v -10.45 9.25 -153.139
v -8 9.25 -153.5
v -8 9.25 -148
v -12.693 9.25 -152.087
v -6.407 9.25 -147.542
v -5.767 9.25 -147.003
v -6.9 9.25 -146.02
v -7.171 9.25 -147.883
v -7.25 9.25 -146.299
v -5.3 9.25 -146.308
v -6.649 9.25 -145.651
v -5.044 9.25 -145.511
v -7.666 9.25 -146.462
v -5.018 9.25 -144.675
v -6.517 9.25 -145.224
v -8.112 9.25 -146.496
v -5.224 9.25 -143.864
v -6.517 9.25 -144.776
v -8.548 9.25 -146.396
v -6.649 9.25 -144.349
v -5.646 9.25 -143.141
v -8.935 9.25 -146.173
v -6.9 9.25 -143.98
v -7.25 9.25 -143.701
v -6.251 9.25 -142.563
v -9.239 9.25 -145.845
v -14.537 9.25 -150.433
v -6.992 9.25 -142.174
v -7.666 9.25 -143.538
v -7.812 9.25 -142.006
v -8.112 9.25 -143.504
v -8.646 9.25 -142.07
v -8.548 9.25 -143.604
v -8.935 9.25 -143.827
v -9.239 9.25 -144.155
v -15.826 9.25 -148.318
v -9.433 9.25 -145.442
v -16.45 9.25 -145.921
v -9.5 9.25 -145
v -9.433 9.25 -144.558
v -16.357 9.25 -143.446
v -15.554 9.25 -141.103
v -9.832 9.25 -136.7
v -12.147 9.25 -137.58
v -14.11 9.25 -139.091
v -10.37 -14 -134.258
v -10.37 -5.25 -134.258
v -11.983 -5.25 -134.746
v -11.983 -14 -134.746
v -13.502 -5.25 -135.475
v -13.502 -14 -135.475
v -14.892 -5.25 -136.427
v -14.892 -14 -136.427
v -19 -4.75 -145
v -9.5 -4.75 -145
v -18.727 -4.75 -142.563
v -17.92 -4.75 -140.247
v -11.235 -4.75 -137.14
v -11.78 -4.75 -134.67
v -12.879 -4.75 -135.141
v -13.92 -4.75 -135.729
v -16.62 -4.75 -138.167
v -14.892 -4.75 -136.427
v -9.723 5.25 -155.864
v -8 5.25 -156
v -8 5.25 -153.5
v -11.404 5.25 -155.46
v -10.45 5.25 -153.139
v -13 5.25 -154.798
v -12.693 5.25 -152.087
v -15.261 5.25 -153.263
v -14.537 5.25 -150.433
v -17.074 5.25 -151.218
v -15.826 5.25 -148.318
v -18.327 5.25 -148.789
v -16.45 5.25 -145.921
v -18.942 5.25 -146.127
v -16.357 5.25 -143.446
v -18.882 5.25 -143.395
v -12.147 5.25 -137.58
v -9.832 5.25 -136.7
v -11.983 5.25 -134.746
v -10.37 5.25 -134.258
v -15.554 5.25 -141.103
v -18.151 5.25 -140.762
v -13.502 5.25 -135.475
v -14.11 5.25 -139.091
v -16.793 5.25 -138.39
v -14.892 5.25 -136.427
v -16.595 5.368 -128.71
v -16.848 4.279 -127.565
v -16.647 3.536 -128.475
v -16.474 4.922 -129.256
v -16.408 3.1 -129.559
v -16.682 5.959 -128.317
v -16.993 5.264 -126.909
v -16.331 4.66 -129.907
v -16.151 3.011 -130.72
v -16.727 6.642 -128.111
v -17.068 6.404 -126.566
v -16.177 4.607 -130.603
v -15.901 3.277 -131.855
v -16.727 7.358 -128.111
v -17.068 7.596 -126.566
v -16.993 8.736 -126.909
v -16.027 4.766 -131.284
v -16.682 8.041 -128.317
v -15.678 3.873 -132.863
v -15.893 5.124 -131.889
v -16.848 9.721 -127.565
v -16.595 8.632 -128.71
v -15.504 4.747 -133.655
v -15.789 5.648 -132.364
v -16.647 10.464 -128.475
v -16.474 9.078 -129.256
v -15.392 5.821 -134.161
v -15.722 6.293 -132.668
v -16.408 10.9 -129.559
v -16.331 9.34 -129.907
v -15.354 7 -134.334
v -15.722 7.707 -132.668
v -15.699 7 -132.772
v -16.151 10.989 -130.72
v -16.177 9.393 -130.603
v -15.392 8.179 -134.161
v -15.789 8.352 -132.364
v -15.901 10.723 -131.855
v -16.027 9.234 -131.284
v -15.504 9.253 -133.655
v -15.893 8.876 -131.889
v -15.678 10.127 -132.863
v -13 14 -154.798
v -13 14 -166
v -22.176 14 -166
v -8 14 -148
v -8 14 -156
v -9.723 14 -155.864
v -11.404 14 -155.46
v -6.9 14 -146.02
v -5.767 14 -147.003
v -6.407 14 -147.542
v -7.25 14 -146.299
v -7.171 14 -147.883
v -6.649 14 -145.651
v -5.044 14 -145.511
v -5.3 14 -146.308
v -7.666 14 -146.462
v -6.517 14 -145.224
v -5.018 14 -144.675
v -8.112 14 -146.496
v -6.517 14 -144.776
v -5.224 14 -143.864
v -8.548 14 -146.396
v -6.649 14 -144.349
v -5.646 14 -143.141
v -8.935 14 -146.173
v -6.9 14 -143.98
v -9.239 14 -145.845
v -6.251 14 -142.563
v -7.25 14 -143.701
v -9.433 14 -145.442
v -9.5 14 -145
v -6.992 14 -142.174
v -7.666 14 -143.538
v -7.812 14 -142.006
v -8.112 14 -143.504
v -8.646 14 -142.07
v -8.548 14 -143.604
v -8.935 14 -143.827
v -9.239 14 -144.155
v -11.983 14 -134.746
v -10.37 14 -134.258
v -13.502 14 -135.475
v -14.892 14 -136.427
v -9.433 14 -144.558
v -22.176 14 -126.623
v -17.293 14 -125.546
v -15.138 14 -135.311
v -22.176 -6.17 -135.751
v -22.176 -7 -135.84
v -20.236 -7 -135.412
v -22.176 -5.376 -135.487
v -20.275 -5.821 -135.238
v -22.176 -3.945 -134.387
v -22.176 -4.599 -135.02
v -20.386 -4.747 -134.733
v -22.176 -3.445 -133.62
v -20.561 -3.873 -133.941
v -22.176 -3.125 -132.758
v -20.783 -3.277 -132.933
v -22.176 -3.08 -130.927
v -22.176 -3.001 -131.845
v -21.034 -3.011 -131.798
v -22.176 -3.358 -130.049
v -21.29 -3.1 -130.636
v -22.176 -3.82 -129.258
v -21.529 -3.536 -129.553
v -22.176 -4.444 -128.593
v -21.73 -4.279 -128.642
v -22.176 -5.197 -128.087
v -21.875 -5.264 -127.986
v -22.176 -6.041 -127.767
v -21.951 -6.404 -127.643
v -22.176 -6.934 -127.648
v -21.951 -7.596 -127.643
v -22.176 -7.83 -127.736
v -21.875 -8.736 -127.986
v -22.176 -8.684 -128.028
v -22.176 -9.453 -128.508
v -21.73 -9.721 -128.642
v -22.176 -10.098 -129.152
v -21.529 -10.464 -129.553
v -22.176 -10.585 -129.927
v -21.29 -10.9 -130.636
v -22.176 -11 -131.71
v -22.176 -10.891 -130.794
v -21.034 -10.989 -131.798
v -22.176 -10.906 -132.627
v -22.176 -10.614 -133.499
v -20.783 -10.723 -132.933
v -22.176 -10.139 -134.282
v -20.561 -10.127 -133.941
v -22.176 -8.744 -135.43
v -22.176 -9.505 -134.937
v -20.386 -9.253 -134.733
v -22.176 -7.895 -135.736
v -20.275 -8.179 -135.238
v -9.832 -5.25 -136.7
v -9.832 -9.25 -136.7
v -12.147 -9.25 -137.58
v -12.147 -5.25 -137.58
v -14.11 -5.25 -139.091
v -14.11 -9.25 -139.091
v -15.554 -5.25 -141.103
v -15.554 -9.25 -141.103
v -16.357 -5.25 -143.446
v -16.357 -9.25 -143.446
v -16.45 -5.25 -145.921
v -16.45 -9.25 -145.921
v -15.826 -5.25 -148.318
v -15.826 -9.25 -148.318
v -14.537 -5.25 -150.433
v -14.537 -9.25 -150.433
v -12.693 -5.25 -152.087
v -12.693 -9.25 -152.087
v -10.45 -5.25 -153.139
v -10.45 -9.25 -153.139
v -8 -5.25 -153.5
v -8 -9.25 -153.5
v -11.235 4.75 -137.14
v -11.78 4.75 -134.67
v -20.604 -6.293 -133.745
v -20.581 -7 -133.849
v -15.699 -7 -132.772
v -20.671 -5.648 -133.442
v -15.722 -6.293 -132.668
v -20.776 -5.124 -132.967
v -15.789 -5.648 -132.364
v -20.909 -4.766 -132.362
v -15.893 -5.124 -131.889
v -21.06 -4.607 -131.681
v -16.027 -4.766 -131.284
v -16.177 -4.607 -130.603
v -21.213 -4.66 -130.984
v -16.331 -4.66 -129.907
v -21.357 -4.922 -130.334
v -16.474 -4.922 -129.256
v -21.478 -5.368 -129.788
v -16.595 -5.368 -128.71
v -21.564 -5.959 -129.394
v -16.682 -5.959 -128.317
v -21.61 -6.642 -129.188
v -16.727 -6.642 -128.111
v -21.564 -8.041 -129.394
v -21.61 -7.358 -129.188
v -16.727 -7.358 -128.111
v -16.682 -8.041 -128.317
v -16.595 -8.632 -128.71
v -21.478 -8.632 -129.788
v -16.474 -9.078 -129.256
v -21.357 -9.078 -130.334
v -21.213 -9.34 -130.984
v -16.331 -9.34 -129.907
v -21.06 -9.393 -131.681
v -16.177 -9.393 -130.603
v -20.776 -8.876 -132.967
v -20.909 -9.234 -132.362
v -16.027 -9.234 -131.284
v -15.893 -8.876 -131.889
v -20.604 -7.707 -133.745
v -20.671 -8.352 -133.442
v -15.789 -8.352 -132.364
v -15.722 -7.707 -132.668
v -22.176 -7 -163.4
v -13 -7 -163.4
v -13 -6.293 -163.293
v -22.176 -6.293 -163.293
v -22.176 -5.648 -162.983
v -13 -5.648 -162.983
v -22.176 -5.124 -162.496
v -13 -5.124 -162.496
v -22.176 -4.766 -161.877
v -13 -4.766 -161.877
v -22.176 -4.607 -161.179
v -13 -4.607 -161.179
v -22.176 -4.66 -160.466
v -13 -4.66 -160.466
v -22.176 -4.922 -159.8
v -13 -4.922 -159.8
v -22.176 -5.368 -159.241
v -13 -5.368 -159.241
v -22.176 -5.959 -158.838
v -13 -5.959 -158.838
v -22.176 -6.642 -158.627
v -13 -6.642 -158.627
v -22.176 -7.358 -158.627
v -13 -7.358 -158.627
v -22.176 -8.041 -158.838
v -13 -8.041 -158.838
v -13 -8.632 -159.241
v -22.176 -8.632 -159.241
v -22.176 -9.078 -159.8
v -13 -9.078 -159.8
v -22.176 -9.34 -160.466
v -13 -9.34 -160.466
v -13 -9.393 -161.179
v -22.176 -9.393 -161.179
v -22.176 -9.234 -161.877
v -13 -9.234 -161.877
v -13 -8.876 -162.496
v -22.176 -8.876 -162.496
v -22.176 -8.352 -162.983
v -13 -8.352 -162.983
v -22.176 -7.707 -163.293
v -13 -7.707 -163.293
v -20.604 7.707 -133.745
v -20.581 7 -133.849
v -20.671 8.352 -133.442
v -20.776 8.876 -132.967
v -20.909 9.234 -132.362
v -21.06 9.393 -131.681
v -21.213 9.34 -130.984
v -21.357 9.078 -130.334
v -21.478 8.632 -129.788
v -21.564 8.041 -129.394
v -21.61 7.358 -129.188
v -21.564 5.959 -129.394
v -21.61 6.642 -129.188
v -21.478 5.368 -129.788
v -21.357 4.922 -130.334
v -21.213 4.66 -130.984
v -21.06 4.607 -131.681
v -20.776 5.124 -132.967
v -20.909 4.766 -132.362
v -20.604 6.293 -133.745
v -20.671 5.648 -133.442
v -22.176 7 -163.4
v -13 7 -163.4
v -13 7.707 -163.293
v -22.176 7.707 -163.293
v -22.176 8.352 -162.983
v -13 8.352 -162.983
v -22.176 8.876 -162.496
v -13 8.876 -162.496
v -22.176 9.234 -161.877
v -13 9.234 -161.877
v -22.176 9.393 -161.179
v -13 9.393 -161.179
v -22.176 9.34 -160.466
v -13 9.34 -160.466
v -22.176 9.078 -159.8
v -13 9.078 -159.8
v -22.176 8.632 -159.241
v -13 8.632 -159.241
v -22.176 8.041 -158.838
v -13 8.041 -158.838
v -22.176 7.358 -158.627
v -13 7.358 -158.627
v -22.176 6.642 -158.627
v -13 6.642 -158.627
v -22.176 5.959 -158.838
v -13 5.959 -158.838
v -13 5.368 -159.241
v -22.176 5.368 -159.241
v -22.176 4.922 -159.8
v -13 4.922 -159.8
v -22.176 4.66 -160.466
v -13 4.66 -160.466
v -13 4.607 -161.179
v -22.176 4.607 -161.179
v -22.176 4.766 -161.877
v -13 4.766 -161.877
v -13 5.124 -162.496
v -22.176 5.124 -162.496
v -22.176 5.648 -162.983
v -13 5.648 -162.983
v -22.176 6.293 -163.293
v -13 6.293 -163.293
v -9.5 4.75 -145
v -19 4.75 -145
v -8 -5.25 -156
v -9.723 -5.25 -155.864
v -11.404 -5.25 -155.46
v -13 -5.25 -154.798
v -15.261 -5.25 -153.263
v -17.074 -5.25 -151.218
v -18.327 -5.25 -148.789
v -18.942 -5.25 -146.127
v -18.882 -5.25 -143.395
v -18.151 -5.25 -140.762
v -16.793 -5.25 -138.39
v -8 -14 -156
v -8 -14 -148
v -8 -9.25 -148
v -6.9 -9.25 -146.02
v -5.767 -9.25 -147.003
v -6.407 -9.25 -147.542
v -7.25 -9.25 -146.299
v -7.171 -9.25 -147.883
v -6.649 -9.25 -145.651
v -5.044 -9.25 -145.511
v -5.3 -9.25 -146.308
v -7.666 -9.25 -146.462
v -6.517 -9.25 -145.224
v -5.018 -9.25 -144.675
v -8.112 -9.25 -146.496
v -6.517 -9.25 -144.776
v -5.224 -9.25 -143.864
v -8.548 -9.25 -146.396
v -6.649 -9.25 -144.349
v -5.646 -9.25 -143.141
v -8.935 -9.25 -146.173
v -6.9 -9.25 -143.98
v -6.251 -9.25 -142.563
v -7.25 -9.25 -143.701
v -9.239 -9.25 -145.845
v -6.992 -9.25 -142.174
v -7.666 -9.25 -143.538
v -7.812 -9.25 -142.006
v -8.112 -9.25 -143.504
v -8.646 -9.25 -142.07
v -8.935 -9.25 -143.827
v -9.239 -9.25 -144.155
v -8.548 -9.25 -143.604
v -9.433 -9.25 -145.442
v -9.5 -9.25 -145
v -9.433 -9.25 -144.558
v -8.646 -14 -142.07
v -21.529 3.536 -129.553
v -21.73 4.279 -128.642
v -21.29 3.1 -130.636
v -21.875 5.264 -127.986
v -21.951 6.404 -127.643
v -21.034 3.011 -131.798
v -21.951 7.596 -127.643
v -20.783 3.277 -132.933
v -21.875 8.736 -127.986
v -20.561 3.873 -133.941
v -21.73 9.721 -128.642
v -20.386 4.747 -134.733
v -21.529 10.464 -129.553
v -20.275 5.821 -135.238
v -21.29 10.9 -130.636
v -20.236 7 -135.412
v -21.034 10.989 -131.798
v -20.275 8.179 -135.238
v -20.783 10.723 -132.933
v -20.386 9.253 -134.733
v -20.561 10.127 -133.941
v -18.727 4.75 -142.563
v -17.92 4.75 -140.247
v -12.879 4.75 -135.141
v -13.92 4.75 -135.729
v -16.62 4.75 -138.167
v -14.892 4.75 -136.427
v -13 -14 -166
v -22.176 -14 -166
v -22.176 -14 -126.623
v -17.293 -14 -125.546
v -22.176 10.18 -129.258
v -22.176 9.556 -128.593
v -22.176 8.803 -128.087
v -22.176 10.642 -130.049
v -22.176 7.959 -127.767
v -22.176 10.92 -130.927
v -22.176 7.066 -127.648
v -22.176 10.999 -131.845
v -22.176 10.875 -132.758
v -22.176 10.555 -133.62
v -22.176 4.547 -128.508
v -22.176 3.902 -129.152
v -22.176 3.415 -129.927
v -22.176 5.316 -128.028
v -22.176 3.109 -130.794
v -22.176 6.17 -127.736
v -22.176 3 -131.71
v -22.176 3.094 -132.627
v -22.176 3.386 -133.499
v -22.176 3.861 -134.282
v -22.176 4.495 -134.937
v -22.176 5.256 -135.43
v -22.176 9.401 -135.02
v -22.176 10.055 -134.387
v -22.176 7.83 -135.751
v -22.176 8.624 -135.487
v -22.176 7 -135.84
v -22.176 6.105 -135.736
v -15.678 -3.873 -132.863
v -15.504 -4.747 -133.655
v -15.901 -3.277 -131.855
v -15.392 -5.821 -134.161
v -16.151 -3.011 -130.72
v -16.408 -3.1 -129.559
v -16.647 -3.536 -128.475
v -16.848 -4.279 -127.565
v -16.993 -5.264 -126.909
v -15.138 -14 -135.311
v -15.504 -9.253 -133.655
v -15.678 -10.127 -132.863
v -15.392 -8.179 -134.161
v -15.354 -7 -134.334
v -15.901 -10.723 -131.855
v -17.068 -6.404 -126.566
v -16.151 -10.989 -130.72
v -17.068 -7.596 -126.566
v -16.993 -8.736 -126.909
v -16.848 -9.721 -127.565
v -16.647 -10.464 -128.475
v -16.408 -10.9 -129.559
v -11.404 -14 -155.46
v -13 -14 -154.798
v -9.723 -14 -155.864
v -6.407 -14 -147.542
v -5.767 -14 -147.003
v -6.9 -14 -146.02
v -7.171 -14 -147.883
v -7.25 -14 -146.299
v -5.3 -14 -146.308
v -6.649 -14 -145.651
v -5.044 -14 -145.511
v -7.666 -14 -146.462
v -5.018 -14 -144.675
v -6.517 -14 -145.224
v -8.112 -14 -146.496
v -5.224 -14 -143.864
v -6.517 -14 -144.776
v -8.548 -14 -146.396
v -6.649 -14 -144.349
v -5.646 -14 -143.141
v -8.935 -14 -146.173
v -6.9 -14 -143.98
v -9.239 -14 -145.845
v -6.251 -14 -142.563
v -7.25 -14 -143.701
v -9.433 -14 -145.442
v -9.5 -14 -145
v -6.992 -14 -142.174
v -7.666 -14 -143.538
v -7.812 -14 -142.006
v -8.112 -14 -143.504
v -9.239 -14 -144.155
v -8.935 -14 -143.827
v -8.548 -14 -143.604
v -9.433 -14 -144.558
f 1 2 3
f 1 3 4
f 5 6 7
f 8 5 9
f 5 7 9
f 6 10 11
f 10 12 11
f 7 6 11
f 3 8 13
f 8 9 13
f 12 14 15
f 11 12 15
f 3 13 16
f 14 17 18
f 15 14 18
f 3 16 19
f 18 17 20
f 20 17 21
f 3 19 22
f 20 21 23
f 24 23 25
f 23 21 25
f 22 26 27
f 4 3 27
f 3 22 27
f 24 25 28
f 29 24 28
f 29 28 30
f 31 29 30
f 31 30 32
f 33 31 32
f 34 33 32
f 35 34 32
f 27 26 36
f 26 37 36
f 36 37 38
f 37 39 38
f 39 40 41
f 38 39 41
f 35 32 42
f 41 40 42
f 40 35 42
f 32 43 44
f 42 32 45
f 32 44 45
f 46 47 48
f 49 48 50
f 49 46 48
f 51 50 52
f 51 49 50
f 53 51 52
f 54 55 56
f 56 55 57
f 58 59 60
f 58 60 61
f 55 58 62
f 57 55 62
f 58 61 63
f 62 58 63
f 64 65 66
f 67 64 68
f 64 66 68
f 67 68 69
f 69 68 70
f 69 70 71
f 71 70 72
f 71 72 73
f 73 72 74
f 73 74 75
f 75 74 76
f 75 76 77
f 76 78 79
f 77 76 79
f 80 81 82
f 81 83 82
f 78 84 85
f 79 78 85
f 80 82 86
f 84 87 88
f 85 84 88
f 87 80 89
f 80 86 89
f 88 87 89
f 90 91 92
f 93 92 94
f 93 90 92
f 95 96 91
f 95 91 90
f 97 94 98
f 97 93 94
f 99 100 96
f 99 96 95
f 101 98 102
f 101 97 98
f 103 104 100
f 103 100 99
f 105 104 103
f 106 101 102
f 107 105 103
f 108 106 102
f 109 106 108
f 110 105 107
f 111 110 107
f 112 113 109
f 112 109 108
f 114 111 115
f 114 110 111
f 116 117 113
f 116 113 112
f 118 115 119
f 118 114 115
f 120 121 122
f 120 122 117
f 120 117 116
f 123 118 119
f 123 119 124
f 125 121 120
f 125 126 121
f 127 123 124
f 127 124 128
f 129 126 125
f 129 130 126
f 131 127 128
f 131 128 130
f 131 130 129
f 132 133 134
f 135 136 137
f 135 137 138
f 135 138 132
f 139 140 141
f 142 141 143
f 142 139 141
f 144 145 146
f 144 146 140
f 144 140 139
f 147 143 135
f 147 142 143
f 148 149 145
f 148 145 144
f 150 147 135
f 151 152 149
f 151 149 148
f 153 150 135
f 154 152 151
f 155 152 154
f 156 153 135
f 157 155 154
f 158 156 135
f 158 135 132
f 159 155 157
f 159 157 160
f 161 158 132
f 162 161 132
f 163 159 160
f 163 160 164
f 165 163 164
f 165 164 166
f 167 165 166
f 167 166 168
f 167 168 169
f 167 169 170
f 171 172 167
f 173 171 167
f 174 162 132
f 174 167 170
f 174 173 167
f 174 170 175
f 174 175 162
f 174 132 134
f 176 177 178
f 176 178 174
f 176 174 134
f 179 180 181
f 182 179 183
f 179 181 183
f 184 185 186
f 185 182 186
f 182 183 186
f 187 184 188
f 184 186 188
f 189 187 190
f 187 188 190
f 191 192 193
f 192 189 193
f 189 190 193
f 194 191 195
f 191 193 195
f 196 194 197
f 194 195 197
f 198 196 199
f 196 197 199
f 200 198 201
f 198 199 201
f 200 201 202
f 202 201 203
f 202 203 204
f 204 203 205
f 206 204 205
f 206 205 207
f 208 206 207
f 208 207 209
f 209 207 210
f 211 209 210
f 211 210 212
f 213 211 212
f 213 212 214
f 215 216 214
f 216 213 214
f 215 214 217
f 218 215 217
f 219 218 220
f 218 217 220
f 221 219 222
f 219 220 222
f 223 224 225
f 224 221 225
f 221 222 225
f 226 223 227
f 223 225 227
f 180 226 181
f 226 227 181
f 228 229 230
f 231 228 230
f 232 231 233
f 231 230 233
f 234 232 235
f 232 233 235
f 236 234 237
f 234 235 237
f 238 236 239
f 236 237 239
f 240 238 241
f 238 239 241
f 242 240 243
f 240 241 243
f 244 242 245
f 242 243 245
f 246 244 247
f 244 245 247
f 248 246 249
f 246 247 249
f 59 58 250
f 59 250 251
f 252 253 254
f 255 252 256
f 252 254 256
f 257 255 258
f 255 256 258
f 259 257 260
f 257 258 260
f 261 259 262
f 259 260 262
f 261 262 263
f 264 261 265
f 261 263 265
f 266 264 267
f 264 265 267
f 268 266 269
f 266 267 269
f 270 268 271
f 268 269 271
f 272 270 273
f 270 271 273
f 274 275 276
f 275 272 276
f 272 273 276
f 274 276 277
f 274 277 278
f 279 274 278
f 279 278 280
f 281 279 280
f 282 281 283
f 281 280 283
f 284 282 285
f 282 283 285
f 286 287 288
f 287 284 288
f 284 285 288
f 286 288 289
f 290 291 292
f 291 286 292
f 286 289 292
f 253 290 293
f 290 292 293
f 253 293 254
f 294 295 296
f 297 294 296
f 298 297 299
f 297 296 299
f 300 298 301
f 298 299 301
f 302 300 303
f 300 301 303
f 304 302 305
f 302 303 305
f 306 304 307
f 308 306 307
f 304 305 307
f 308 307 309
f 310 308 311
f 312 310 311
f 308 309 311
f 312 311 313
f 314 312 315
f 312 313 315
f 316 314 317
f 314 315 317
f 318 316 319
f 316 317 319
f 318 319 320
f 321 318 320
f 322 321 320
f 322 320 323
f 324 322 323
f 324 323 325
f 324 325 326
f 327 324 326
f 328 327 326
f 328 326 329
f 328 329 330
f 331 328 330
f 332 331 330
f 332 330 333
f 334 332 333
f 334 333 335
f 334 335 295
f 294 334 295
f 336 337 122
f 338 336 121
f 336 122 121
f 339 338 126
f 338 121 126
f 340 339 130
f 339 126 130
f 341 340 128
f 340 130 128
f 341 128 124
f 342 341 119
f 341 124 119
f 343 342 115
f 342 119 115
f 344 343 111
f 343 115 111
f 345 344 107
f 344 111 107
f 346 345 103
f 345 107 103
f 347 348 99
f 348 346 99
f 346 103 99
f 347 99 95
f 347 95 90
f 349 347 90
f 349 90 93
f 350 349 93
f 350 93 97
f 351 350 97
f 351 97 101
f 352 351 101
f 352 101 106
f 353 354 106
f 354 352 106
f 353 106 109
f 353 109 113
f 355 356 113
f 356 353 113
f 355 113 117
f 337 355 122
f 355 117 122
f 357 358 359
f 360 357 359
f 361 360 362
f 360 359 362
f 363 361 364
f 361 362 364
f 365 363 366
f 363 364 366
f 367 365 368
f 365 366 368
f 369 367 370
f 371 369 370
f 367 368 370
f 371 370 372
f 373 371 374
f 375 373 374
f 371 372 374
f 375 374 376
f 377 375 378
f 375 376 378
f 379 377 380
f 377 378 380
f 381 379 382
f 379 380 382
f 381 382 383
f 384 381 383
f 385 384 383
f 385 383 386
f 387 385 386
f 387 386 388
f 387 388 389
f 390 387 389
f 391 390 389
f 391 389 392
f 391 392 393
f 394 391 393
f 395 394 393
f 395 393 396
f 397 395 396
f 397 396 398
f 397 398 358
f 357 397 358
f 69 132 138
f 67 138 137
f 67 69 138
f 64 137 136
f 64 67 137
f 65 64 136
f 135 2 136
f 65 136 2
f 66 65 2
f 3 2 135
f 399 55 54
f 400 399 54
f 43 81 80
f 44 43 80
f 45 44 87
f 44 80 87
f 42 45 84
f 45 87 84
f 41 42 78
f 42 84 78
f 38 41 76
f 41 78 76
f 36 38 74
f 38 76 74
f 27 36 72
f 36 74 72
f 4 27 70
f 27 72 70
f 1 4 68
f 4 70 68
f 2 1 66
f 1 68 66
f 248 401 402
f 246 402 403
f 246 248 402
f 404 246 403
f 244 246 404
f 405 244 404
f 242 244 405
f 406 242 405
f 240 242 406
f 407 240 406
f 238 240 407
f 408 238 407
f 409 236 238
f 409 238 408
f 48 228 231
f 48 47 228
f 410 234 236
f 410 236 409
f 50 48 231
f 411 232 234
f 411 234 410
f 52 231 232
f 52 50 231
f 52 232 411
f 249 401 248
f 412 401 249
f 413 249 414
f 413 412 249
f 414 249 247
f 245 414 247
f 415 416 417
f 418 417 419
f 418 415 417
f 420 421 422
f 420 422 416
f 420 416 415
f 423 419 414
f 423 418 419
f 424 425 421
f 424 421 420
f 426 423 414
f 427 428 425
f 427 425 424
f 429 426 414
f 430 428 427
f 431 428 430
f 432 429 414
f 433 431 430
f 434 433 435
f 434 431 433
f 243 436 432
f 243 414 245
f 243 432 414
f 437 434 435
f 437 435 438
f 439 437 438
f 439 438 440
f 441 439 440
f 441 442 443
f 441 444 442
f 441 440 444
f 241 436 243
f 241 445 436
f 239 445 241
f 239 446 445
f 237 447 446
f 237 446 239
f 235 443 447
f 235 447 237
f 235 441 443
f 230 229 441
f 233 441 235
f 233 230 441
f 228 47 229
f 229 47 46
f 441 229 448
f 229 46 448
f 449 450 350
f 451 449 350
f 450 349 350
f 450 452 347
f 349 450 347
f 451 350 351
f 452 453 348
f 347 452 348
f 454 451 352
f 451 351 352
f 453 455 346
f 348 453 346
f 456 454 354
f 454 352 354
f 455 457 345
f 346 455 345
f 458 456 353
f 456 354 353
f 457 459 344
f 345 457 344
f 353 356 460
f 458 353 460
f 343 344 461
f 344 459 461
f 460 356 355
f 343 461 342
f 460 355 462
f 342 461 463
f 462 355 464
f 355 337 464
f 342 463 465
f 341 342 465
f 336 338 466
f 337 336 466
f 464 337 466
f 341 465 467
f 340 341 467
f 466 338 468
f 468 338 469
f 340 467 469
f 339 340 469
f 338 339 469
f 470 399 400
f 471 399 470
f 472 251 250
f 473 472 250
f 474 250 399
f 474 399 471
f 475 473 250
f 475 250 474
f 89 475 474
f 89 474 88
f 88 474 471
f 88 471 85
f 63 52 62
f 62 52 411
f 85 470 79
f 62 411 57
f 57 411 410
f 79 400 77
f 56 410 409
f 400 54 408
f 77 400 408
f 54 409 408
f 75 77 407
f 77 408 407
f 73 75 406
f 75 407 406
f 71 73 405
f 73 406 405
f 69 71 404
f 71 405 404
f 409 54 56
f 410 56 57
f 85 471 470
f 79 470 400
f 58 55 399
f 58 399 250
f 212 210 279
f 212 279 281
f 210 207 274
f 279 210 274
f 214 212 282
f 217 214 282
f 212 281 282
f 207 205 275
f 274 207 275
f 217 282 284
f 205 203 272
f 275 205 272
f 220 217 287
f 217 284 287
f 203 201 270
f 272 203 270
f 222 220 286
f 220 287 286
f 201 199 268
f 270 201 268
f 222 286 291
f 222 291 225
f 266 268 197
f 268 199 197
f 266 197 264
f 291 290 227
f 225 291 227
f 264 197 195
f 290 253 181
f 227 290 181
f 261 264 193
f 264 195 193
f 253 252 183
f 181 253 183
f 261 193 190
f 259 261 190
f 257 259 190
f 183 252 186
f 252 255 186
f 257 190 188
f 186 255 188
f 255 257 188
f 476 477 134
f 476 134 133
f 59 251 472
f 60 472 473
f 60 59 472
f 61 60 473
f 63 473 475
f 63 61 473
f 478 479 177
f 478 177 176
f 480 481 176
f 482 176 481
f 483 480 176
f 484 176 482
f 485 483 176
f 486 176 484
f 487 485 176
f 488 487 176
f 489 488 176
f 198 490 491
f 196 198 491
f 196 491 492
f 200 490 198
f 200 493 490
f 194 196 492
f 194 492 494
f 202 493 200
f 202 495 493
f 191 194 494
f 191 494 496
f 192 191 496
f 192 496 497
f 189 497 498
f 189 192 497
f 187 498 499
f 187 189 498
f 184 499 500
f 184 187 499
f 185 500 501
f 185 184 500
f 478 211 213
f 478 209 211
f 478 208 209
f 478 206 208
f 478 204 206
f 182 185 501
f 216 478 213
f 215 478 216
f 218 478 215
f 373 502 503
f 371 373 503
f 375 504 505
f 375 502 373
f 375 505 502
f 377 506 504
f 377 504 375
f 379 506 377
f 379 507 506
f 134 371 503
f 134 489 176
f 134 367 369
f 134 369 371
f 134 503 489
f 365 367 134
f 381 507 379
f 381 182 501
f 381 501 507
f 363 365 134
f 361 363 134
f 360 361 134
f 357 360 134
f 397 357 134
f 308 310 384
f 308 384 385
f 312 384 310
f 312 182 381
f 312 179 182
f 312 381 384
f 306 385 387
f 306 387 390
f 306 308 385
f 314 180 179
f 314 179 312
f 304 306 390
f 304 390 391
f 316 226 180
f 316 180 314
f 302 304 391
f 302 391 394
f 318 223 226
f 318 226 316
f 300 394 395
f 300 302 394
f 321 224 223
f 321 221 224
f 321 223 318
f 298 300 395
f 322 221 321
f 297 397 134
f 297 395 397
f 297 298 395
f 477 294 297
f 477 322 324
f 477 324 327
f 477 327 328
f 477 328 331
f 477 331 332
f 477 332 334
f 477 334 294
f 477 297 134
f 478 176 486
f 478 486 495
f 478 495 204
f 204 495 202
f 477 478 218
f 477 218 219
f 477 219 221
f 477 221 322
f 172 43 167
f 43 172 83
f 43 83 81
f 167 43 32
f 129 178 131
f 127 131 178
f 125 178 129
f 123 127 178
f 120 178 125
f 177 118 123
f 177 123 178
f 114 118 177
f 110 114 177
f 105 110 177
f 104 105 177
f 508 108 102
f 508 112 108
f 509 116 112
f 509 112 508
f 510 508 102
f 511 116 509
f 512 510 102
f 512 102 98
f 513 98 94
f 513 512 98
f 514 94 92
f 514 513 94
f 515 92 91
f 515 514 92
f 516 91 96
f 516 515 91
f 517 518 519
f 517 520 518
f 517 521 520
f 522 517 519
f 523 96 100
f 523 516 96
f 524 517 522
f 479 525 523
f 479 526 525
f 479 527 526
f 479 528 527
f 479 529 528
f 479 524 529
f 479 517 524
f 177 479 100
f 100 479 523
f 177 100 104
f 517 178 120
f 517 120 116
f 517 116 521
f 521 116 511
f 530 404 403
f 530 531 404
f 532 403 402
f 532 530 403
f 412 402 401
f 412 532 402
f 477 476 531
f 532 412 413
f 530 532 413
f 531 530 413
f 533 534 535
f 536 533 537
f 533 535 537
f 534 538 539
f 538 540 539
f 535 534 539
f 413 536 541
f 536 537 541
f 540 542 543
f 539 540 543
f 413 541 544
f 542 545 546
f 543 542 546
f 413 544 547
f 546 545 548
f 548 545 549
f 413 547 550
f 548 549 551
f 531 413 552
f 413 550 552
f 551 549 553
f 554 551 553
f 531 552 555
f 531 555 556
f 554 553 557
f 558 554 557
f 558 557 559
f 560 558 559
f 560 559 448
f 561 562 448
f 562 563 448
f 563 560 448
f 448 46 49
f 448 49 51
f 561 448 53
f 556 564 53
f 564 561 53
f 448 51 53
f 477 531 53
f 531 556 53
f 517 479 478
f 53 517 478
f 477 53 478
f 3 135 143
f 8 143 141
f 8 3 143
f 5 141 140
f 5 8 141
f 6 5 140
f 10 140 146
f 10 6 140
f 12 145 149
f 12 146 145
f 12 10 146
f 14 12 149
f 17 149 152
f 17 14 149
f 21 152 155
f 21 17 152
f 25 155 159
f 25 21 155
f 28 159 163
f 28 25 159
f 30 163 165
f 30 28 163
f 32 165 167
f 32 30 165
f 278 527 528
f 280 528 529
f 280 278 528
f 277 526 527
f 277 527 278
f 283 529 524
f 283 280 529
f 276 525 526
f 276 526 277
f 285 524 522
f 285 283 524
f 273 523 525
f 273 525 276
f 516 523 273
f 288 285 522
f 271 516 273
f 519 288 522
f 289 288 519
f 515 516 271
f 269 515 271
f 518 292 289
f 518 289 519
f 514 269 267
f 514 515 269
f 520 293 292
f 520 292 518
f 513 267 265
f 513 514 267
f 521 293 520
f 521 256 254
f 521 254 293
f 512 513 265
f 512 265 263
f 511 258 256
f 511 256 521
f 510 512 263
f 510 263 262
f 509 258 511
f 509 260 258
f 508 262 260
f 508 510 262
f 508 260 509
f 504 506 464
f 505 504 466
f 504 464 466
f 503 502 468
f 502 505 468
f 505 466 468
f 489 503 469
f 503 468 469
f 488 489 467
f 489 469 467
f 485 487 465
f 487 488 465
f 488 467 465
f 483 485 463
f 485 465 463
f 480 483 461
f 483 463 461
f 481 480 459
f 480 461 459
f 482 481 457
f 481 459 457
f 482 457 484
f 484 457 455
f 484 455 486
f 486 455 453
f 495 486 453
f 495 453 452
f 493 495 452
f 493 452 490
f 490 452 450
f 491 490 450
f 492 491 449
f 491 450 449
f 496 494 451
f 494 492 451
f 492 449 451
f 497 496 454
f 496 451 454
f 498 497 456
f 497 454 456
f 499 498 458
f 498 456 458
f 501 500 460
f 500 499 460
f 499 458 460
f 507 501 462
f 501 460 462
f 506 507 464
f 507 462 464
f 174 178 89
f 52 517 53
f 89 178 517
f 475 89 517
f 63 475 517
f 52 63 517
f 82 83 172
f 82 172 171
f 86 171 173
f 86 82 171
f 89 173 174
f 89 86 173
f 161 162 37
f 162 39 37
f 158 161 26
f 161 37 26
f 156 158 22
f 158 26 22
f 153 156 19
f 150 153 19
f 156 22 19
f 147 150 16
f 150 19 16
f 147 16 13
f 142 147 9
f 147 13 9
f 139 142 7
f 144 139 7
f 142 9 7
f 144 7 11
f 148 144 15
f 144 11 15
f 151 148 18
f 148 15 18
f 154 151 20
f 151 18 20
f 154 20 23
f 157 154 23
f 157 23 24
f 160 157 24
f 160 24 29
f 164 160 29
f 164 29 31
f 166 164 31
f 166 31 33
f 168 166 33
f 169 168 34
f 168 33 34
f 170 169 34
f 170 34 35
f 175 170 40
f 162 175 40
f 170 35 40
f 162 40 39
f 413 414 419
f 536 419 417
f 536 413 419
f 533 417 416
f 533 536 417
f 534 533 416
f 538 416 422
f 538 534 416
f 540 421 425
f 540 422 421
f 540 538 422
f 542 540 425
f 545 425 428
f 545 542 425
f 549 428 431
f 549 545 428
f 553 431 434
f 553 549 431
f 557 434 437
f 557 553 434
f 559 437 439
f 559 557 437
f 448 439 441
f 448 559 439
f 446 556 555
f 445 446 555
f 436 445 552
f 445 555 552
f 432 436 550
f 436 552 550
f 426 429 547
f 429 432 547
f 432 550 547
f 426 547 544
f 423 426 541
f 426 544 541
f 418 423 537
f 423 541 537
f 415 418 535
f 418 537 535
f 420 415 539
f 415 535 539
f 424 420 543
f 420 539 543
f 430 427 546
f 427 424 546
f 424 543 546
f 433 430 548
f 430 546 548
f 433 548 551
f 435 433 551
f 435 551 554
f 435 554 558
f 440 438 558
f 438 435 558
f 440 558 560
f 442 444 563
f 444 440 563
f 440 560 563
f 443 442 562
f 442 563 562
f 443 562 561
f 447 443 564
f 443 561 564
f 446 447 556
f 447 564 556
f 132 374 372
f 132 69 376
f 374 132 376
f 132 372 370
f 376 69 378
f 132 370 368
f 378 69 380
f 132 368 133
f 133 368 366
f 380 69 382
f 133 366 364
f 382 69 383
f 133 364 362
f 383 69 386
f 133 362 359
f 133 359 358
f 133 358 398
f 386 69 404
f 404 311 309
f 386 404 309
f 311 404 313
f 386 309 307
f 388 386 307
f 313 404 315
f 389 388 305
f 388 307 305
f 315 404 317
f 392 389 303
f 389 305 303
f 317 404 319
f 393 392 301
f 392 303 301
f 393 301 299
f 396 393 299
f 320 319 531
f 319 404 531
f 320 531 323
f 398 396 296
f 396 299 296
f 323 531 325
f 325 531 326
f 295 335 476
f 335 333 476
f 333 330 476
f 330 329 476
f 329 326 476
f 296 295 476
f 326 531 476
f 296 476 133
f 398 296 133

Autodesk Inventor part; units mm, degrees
ref_plane "YZ Plane" through (0, 0, 0) normal (1, 0, 0) x (0, 1, 0)
ref_plane "XZ Plane" through (0, 0, 0) normal (0, 1, 0) x (-1, 0, 0)
ref_plane "XY Plane" through (0, 0, 0) normal (0, 0, 1) x (1, 0, 0)
sketch "Sketch1" plane through (0, 0, 0) normal (0, 1, 0) x (-1, 0, 0)
  line L0 (0, 0) -> (0, -145)
  line L1 (0, -145) -> (3, -145)
  line L2 (3, -145) -> (8, -145)
  circle A0 centre (8, -145) radius 1.5
  line L3 (0, 0) -> (40, 0)
  line L4 (0, -145) -> (0, -250)
  line L5 (0, -250) -> (8, -250)
  line L6 (8, -156) -> (8, -148)
  circle A1 centre (8, -145) radius 3
  line L7 (13, -250) -> (8, -250)
  line L8 (8, -156) -> (13, -156)
  line L9 (13, -156) -> (13, -166)
  line L10 (10.3705, -134.2585) -> (15.1383, -135.3107)
  line L11 (15.1383, -135.3107) -> (14.892, -136.4268)
  line L12 (15.1383, -135.3107) -> (17.2934, -125.5456)
  line L13 (17.2934, -125.5456) -> (12.5256, -124.4934)
  line L14 (17.2934, -125.5456) -> (22.1759, -126.6232)
  line L15 (13, -166) -> (18, -166)
  line L16 (22.1759, -126.6232) -> (22.1759, -166)
  line L17 (22.1759, -166) -> (18, -166)
  arc A2 (0, -137.4502) -> (0, -152.5498) centre (8, -145) ccw
  arc A3 (8, -156) -> (10.3705, -134.2585) centre (8, -145) ccw
  line L18 (40, 0) -> (12.5256, -124.4934)
  line L19 (10.3705, -134.2585) -> (8.6465, -142.0705)
  line L20 (8, -148) -> (8, -153)
  arc A4 (0, -142.1277) -> (0, -147.8723) centre (8, -145) ccw
  arc A5 (8, -153.5) -> (9.8318, -136.6997) centre (8, -145) ccw
  line L21 (8, -153.5) -> (8, -156)
  line L22 (9.8318, -136.6997) -> (10.3705, -134.2585)
  line L23 (9.5, -145) -> (11.2347, -137.1396)
  line L24 (9.5, -145) -> (16.5, -145)
  line L25 (13, -156) -> (13, -154.798)
  line L26 (16.5, -145) -> (19, -145)
  line L27 (11.2347, -137.1396) -> (11.7798, -134.6698)
  dimension "d4" = 3
  dimension "d0" = 145
  dimension "d1" = 3
  dimension "d2" = 5
  dimension "d5" = 40
  dimension "d6" = 105
  dimension "d8" = 6
  dimension "d10" = 10
  dimension "d11" = 10
  dimension "d12" = 5
  dimension "d13" = 5
extrude "Extrusion4" add sketch "Sketch1" along normal mid plane 28 contours L14 L16 L17 L15 L9 L25 A3 L11 L12 | A1 L23 A0 L2 | L2 A0 L24 A1 | A3 L27 A5 L19 | A3 L26 A5 L27 | L19 A5 L23 A1 | A1 L24 A5 L6 | A3 L6 A5 L26 | L23 A1 L24 | L23 A5 L24 A1
extrude "Extrusion5" cut sketch "Sketch1" along normal mid plane 18.5 contours A1 L23 A0 L2 | L2 A0 L24 A1 | L19 A5 L23 A1 | A1 L24 A5 L6 | L23 A1 L24 | L23 A5 L24 A1
extrude "Extrusion6" cut sketch "Sketch1" along normal mid plane 10.5 contours A3 L27 A5 L19 | A3 L26 A5 L27 | A3 L6 A5 L26
extrude "Extrusion7" add sketch "Sketch1" along normal mid plane 9.5 contours A3 L26 A5 L27 | L23 A1 L24 | L23 A5 L24 A1
sketch "Sketch2" plane through (-17.2934, -14, -125.5456) normal (0.9765029, 0, 0.2155041) x (0.2155041, 0, -0.9765029)
  line L0 (0, 28) -> (0, 14)
  line L1 (0, 0) -> (0, 28) projected
  line L2 (0, 14) -> (5, 14)
  line L3 (5, 14) -> (5, 21)
  line L4 (5, 14) -> (5, 7)
  circle A0 centre (5, 21) radius 2.4
  circle A1 centre (5, 7) radius 2.4
  circle A2 centre (5, 21) radius 4
  circle A3 centre (5, 7) radius 4
  point P0 (-118.8689, 14)
  dimension "d29" = 5
  dimension "d30" = 7
  dimension "d31" = 7
  dimension "d32" = 4.8
  dimension "d33" = 4.8
  dimension "d34" = 8
  dimension "d35" = 8
extrude "Extrusion8" cut sketch "Sketch2" against normal blind 10.5 contours A0 | A1 | A2 | A3
extrude "Extrusion9" add sketch "Sketch2" against normal blind 5
sketch "Sketch3" plane through (-13, -14, -166) normal (1, 0, 0) x (0, 0, -1)
  line L0 (0, 28) -> (0, 14)
  line L1 (0, 0) -> (0, 28) projected
  line L2 (0, 14) -> (-5, 14)
  line L3 (-5, 14) -> (-5, 21)
  line L4 (-5, 14) -> (-5, 7)
  circle A0 centre (-5, 21) radius 2.4
  circle A1 centre (-5, 7) radius 2.4
  point P0 (-166, 14)
  dimension "d40" = 5
  dimension "d41" = 7
  dimension "d42" = 7
  dimension "d43" = 4.8
  dimension "d44" = 4.8
extrude "Extrusion10" cut sketch "Sketch3" against normal blind 10
properties part number "push_clip"
